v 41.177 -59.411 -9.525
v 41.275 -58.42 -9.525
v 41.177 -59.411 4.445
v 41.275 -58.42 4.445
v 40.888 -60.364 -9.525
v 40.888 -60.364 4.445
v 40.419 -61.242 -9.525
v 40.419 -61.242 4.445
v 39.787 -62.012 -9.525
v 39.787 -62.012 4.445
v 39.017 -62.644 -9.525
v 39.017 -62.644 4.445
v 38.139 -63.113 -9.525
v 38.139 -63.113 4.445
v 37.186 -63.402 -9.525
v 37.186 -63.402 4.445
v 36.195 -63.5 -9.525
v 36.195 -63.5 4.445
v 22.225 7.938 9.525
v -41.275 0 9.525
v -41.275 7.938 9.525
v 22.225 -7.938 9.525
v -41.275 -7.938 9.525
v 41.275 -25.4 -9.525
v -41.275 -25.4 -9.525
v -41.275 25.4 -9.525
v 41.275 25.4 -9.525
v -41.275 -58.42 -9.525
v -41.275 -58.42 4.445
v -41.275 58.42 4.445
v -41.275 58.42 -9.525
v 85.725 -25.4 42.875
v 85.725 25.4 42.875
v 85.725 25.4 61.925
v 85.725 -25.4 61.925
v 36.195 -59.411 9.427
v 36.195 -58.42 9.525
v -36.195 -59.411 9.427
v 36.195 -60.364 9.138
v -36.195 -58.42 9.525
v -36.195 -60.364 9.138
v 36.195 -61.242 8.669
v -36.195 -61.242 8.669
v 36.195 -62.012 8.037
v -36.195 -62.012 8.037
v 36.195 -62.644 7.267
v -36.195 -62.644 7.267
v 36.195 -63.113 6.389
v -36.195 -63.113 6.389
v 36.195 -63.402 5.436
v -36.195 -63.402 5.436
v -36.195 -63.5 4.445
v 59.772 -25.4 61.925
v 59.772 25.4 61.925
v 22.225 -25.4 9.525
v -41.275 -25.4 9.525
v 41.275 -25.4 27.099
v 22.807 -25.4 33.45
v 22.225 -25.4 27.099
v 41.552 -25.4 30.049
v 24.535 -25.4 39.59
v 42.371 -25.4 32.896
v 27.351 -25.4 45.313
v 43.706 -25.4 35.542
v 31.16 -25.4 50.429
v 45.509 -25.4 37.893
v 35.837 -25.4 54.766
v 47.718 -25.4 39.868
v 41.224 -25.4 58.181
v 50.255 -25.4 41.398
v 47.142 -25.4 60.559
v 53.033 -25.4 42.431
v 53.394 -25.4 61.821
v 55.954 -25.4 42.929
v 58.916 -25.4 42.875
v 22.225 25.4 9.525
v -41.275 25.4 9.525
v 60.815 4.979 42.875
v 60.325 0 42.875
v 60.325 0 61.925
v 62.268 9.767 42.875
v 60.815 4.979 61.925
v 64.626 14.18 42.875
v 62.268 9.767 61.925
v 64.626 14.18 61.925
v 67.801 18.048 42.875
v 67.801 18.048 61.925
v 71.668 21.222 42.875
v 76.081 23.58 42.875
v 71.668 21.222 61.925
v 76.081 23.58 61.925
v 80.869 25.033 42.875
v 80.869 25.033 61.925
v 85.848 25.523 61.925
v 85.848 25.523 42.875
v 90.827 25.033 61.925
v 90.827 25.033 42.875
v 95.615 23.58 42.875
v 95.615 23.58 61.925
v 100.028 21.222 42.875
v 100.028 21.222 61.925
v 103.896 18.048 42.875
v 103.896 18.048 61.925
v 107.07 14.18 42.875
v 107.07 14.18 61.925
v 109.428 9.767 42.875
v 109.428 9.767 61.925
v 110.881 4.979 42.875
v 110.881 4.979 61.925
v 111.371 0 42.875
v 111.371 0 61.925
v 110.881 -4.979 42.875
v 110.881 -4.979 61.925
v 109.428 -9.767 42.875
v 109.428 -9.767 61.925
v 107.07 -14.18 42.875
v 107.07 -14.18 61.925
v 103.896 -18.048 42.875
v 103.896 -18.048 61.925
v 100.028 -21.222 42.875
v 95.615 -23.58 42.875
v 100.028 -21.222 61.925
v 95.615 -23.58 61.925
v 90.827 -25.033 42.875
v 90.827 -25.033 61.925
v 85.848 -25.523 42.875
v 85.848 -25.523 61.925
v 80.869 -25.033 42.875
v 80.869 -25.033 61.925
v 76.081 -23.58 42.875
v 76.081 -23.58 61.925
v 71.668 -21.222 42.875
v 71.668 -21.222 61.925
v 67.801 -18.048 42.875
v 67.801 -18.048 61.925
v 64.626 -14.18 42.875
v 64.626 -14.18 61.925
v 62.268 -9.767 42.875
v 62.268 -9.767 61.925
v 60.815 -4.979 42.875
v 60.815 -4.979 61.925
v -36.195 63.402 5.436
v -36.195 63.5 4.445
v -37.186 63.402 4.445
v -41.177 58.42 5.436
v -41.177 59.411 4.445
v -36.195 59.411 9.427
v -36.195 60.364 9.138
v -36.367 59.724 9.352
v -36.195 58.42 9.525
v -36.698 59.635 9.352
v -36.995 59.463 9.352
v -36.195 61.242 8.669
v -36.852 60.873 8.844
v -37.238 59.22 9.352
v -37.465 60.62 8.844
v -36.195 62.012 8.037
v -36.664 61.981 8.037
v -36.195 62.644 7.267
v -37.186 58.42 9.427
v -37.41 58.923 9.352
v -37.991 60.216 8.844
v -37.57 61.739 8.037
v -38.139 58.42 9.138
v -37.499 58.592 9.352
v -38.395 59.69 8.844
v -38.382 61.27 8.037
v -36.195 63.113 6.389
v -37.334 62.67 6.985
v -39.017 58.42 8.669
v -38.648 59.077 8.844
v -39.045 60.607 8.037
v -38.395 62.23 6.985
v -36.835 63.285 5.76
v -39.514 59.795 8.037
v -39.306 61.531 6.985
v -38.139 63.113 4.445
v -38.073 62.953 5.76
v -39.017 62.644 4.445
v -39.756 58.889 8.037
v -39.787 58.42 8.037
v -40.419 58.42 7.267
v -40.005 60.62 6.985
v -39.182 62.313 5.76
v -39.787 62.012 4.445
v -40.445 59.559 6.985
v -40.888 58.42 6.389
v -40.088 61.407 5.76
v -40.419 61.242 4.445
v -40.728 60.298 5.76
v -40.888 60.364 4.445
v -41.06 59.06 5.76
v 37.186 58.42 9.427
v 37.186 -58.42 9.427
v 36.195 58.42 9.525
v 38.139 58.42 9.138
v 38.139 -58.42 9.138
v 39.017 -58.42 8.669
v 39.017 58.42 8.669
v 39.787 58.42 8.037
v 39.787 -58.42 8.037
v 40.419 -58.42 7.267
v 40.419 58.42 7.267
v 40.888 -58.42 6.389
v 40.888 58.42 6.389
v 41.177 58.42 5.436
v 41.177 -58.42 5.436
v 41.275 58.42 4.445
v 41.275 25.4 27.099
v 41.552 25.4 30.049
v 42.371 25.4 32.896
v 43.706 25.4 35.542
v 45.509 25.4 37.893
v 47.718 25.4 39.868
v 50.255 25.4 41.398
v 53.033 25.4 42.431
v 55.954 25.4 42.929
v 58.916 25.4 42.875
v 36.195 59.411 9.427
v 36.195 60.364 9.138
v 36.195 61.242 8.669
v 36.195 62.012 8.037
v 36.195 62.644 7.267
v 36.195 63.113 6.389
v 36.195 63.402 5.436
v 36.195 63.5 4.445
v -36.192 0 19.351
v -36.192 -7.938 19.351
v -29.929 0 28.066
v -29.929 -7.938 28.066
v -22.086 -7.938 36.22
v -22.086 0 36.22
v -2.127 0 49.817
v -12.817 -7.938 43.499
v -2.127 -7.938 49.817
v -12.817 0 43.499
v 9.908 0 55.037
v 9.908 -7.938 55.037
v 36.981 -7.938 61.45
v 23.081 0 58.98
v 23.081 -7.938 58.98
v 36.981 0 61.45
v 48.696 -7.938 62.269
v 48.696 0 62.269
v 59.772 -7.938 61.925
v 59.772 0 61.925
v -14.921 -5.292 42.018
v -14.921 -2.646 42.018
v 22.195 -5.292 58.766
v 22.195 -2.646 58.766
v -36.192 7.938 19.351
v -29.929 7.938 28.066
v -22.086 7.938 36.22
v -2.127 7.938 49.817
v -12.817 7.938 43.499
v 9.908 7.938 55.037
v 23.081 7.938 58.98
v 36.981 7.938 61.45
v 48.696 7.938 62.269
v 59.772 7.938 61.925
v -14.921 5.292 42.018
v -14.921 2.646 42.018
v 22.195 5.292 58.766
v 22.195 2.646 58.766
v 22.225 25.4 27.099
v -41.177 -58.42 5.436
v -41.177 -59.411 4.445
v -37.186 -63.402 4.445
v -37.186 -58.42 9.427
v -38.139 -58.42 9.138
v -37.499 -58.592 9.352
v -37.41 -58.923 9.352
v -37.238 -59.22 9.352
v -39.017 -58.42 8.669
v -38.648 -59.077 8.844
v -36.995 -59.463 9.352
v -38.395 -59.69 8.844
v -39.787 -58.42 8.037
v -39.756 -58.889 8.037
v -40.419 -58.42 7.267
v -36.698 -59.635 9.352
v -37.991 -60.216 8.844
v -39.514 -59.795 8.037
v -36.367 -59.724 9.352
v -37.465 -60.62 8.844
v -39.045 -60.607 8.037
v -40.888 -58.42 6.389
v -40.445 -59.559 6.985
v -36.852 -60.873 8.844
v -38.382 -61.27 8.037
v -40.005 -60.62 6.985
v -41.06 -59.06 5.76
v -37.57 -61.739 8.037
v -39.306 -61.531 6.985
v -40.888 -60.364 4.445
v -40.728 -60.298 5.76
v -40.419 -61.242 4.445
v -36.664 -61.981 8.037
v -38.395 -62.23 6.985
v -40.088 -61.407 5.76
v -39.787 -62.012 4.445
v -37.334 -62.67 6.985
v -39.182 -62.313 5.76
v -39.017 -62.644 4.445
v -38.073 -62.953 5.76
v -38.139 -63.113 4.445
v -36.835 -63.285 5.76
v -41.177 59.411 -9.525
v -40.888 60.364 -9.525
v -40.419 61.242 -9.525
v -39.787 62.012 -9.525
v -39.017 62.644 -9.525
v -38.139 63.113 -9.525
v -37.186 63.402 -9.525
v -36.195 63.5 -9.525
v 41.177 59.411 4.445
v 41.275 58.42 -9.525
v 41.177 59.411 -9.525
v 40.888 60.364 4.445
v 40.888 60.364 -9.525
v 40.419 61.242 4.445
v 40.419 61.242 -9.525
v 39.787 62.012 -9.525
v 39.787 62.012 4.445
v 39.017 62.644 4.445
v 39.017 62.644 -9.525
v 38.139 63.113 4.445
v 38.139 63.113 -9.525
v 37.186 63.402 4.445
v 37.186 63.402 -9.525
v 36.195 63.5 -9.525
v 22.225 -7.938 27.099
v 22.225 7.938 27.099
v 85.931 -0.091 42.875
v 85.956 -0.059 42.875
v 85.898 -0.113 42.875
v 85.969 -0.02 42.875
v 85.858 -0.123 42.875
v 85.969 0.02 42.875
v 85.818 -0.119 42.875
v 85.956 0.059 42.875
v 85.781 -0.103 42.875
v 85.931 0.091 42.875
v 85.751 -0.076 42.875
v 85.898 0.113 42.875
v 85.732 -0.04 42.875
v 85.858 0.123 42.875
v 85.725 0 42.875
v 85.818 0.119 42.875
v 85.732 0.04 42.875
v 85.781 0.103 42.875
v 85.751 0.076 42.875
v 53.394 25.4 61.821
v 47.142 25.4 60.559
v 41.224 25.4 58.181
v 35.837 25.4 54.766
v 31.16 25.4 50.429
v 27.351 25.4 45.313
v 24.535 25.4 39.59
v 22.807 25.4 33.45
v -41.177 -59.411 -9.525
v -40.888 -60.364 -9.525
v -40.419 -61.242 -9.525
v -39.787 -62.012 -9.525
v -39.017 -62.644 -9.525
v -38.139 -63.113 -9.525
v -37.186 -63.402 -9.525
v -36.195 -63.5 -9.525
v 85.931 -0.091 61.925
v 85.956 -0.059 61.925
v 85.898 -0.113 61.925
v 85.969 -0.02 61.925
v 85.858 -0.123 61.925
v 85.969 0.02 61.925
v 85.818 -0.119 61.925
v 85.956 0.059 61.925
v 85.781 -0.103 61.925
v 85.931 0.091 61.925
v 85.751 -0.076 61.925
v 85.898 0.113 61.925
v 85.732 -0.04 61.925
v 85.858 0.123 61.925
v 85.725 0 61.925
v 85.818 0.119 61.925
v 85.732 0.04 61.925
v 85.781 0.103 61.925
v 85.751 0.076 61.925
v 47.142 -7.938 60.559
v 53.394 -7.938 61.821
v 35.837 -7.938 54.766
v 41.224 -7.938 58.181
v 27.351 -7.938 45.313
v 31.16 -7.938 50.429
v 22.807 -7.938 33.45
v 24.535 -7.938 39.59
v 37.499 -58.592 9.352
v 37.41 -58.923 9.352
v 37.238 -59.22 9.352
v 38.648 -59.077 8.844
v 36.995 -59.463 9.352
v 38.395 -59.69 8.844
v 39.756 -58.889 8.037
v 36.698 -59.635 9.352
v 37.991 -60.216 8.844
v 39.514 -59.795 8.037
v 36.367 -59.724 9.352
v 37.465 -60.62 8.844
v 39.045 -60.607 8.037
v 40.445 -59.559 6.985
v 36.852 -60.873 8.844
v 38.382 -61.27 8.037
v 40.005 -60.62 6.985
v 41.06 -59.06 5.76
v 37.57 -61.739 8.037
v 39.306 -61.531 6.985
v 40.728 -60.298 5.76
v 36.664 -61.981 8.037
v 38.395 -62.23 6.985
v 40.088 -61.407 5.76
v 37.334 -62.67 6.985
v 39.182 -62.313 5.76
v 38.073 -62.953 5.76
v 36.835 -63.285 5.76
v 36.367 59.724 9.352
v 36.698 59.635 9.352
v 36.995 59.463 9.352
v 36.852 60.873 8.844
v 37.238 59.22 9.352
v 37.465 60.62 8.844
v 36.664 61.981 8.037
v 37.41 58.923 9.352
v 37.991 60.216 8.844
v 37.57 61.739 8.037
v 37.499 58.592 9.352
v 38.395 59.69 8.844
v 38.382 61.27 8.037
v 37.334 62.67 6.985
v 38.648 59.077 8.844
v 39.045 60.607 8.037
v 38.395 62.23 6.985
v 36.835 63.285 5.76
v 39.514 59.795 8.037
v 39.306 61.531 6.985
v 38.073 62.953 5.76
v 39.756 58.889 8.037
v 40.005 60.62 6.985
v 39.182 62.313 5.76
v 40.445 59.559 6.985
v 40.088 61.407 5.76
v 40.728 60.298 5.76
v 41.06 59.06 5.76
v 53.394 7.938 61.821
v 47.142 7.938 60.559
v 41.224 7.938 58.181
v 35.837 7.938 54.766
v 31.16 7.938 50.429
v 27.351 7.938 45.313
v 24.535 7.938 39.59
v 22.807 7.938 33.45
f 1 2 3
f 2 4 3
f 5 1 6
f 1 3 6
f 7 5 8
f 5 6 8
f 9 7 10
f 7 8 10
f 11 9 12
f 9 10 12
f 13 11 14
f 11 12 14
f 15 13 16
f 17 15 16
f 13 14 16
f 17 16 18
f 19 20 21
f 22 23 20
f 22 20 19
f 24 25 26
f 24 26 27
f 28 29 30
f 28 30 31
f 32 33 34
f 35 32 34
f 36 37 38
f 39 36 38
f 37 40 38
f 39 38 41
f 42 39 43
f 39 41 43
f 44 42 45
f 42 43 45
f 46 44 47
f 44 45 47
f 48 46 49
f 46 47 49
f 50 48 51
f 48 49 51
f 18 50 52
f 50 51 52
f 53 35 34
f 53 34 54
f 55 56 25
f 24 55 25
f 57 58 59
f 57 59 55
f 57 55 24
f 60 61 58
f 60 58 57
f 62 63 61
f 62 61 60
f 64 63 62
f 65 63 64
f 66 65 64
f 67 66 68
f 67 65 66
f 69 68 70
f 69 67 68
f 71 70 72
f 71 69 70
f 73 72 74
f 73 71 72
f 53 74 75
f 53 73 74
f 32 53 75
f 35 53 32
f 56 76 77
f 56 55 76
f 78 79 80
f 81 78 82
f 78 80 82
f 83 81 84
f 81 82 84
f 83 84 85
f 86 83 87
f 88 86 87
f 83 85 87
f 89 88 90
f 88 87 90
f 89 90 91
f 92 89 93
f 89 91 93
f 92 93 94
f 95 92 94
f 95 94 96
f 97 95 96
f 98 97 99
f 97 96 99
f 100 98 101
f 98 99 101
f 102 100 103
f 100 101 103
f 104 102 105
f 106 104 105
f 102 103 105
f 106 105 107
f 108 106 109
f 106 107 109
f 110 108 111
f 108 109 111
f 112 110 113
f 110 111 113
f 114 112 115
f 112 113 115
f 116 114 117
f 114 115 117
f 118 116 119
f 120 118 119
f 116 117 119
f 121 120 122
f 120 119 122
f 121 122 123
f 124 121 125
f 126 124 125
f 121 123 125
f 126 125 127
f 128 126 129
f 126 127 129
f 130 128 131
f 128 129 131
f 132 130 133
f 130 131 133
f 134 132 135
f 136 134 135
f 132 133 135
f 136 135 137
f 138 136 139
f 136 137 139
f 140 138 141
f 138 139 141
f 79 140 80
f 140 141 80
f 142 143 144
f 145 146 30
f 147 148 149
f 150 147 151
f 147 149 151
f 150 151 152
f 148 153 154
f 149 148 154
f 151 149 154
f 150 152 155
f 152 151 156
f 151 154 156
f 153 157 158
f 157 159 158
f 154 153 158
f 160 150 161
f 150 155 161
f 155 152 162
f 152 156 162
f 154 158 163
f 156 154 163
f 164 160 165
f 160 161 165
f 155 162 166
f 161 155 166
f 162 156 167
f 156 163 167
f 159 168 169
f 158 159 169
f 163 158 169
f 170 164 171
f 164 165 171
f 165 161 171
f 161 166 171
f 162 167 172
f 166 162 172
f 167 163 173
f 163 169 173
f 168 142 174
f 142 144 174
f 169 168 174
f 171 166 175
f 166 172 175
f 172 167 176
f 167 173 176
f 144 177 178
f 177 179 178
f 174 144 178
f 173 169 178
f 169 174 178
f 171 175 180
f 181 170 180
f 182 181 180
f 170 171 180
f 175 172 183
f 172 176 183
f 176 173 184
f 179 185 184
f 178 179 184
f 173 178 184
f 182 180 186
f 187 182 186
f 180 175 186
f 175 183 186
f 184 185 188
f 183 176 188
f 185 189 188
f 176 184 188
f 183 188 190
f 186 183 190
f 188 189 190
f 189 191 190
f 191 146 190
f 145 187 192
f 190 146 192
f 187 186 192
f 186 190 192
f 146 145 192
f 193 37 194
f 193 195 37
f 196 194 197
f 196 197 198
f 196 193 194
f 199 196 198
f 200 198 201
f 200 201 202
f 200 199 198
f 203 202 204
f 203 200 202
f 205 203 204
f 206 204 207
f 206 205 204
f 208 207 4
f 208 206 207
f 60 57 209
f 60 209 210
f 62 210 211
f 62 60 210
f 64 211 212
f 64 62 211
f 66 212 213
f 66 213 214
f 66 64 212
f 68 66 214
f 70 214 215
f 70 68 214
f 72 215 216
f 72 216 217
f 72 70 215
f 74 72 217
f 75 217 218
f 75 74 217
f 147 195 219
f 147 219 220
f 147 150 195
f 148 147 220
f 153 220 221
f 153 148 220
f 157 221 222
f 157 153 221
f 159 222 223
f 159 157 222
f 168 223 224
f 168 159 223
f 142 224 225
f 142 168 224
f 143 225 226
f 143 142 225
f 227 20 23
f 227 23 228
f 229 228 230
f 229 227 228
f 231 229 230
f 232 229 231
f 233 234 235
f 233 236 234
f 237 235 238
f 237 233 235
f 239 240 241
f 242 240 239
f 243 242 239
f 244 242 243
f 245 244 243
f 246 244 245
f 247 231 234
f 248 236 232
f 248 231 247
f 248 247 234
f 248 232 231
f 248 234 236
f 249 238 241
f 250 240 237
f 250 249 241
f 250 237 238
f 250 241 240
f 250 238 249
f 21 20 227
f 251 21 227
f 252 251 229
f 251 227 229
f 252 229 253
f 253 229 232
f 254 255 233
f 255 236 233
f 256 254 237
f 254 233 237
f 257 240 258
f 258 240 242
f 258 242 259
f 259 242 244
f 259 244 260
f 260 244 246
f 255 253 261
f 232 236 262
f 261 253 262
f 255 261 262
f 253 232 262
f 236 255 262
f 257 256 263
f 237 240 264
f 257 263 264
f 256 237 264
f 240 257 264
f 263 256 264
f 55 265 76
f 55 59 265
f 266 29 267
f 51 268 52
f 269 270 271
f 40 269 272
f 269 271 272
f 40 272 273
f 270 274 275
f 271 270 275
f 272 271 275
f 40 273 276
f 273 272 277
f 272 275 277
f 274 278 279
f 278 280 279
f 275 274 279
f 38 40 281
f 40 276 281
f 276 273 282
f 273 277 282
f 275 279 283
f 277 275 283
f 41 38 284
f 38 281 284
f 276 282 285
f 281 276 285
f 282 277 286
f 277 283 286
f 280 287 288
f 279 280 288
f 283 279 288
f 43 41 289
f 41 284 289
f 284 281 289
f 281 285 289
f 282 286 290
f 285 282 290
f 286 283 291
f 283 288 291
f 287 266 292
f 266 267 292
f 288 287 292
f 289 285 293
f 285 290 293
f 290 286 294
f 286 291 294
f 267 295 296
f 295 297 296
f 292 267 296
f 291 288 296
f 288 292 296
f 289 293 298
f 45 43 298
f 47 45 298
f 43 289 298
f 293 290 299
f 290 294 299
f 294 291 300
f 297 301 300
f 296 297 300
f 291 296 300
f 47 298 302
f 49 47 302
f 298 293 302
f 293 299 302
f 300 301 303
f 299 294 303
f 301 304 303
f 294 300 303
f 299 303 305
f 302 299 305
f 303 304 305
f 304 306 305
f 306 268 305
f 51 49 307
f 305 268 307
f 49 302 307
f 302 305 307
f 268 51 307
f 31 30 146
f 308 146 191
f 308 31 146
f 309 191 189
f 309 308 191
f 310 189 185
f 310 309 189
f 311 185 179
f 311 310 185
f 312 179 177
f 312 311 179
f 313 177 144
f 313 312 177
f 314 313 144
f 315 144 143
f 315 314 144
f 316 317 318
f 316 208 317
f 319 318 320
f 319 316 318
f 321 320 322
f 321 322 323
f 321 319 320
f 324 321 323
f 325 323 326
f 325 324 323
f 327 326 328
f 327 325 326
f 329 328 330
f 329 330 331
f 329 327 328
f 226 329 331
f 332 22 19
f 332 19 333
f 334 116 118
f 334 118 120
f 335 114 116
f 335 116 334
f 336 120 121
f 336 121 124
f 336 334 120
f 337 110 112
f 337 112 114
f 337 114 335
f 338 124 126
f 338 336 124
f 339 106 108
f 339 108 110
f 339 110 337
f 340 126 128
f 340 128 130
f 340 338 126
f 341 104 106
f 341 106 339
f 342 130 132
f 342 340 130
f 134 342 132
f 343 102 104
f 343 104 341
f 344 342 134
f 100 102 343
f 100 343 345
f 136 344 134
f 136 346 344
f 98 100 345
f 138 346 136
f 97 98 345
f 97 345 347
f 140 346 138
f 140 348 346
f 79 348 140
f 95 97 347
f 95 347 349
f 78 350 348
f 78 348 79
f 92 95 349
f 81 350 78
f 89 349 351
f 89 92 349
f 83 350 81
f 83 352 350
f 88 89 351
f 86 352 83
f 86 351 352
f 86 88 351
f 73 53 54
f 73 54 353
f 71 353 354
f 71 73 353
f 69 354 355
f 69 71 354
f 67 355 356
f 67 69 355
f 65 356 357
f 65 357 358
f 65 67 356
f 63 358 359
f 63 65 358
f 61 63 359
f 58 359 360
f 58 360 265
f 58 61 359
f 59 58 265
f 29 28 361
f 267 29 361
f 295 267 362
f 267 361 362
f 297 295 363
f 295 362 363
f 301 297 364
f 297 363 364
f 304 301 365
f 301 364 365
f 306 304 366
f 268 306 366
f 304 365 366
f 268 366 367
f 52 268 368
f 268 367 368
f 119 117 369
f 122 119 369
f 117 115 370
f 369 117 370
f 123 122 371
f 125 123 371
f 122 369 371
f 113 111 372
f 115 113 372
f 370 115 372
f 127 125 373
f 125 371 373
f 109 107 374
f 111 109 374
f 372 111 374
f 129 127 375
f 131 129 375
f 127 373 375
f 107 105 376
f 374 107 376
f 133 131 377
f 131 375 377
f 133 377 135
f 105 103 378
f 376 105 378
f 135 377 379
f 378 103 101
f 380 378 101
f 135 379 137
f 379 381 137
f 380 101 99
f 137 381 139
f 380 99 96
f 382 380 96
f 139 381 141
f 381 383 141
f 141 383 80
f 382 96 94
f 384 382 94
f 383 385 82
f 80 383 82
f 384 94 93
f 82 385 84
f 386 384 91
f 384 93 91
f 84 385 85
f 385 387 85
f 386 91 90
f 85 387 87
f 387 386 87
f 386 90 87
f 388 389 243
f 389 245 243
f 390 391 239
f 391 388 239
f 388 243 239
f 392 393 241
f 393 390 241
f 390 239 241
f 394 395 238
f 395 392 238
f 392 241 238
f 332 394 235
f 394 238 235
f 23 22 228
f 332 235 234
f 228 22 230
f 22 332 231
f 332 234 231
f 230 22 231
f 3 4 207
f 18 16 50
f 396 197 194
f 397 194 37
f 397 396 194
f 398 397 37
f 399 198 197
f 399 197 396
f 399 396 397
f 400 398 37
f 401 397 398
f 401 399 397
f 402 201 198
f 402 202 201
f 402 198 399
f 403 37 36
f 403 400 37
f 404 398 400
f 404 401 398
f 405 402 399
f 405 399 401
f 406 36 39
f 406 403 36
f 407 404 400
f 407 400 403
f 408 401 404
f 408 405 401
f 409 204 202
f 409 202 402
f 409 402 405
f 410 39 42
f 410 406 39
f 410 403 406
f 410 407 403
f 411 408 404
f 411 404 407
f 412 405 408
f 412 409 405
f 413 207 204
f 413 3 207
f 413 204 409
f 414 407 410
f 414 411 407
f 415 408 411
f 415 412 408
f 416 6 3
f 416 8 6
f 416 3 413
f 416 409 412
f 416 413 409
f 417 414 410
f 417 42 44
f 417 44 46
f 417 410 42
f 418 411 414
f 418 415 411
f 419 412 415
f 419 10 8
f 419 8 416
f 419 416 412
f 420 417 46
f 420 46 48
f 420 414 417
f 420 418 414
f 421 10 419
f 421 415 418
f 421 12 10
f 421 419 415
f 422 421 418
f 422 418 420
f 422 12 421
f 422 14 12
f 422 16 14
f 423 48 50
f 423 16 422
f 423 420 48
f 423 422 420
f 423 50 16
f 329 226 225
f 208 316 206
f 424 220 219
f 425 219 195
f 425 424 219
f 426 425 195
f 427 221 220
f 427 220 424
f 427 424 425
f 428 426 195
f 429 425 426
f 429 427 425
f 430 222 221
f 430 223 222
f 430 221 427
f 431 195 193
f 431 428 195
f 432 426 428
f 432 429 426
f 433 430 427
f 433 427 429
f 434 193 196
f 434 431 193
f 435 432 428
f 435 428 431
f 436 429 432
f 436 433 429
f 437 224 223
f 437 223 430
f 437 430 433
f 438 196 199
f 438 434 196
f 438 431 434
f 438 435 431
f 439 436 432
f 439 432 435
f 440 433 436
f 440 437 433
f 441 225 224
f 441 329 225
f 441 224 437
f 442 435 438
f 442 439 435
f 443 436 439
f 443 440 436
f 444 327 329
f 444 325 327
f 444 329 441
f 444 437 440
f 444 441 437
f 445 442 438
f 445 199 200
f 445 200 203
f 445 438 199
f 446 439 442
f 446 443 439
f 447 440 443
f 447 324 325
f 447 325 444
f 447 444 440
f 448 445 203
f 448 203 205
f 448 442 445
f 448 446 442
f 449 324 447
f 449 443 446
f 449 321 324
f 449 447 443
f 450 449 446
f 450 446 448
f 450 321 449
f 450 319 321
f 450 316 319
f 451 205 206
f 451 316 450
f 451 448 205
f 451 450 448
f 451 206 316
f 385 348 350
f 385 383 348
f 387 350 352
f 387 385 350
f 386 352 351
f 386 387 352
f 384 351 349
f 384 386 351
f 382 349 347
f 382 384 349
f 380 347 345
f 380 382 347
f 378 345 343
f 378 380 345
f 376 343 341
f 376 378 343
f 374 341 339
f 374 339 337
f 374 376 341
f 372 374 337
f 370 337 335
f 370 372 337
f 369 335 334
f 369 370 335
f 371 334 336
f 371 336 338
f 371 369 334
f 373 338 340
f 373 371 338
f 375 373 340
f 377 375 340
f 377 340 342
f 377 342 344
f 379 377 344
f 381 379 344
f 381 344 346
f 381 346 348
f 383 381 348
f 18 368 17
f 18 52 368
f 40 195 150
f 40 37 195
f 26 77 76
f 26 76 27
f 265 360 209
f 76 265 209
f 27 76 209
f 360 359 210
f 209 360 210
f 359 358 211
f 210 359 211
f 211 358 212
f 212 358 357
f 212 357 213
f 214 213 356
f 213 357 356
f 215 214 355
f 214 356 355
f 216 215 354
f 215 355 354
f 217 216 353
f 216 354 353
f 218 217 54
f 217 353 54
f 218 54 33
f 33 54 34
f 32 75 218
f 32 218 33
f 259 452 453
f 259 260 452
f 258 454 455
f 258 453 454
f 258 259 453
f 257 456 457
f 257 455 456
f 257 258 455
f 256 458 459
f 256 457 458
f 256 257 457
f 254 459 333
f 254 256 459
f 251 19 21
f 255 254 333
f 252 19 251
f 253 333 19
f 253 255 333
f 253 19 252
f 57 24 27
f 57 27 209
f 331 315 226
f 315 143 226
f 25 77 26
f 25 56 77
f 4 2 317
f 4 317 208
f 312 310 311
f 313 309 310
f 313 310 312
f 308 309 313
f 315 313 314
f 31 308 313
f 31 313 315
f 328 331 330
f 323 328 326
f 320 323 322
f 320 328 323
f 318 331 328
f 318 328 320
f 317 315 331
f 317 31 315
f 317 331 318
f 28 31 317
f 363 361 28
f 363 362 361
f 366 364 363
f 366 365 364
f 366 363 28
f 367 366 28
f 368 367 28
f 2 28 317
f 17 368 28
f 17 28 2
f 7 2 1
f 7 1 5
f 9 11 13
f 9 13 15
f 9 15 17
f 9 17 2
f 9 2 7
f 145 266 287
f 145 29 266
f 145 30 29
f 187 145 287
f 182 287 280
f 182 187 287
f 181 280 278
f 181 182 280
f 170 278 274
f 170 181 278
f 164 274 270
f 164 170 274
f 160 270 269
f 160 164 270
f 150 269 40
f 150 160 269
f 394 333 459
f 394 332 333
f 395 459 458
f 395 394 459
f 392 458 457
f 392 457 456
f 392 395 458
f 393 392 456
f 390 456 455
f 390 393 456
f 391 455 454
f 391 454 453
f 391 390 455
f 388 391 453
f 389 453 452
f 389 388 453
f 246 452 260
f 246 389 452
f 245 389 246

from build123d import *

# Parameters (mm, degrees)
F1_DEPTH = 63.5
F0_W     = 25.4
F0_H     = 19.0500000358
F2_DEPTH = 25.4
F3_DEPTH = 7.9375
F5_R     = 5.08


with BuildPart() as f1:
    # F0 (on Front) → F1 (new body, symmetric)
    with BuildSketch(Plane.XZ):
        Polygon((-41.275, 9.525), (-41.275, -9.525), (41.275, -9.525), (41.275, 9.525), (22.2249999642, 9.525), align=None)
    extrude(amount=F1_DEPTH, both=True)

    # F5
    f5_edges = [f1.edges().sort_by_distance(p)[0] for p in [
        (41.275, -63.5, 0),
        (-41.275, -63.5, 0),
        (41.275, 63.5, 0),
        (-41.275, 63.5, 0),
        (0, 63.5, 9.525),
        (-41.275, 0, 9.525),
        (41.275, 0, 9.525),
        (0, -63.5, 9.525),
    ]]
    fillet(f5_edges, radius=F5_R)


with BuildPart() as f2:
    # F0 (on Front) → F2 (new body, symmetric)
    with BuildSketch(Plane.XZ):
        Polygon((-41.275, 9.525), (-41.275, -9.525), (41.275, -9.525), (41.275, 9.525), (22.2249999642, 9.525), align=None)
        with BuildLine():
            Line((22.2249999642, 9.525), (41.275, 9.525))
            Line((41.275, 9.525), (41.275, 27.0987547464))
            ThreePointArc((41.275, 27.0987547464), (46.5675267568, 38.9320503591), (58.9161823693, 42.8752))
            Line((58.9161823693, 42.8752), (60.325, 42.8752))
            Line((60.325, 42.8752), (60.325, 61.9252000358))
            Line((60.325, 61.9252000358), (59.7718954991, 61.9252000358))
            ThreePointArc((59.7718954991, 61.9252000358), (33.3993586708, 52.7046654694), (22.2249999642, 27.0987547464))
            Line((22.2249999642, 27.0987547464), (22.2249999642, 9.525))
        make_face()
        with Locations((73.025, 52.4002000179)):
            Rectangle(F0_W, F0_H)
    extrude(amount=F2_DEPTH, both=True)


with BuildPart() as f3:
    # F0 (on Front) → F3 (new body, symmetric)
    with BuildSketch(Plane.XZ):
        with BuildLine():
            add(Edge.make_bspline(
                [(-41.275, 9.525), (-23.7360652536, 50.6103560328), (25.3975912929, 64.8403167725), (59.7718954991, 61.9252000358)],
                knots=[0, 0, 0, 0, 113.8255509708, 113.8255509708, 113.8255509708, 113.8255509708], degree=3))
            Line((-41.275, 9.525), (22.2249999642, 9.525))
            Line((22.2249999642, 9.525), (22.2249999642, 27.0987547464))
            ThreePointArc((22.2249999642, 27.0987547464), (33.3993586708, 52.7046654694), (59.7718954991, 61.9252000358))
        make_face()
    extrude(amount=F3_DEPTH, both=True)


with BuildPart() as f4:
    # F0 (on Front) → F4 (revolve)
    with BuildSketch(Plane.XZ):
        with Locations((73.025, 52.4002000179)):
            Rectangle(F0_W, F0_H)
    revolve(axis=Axis((85.8480844794, 0, 52.3875), (0, 0, -1)))


solid = Compound([f1.part, f2.part, f3.part, f4.part])
